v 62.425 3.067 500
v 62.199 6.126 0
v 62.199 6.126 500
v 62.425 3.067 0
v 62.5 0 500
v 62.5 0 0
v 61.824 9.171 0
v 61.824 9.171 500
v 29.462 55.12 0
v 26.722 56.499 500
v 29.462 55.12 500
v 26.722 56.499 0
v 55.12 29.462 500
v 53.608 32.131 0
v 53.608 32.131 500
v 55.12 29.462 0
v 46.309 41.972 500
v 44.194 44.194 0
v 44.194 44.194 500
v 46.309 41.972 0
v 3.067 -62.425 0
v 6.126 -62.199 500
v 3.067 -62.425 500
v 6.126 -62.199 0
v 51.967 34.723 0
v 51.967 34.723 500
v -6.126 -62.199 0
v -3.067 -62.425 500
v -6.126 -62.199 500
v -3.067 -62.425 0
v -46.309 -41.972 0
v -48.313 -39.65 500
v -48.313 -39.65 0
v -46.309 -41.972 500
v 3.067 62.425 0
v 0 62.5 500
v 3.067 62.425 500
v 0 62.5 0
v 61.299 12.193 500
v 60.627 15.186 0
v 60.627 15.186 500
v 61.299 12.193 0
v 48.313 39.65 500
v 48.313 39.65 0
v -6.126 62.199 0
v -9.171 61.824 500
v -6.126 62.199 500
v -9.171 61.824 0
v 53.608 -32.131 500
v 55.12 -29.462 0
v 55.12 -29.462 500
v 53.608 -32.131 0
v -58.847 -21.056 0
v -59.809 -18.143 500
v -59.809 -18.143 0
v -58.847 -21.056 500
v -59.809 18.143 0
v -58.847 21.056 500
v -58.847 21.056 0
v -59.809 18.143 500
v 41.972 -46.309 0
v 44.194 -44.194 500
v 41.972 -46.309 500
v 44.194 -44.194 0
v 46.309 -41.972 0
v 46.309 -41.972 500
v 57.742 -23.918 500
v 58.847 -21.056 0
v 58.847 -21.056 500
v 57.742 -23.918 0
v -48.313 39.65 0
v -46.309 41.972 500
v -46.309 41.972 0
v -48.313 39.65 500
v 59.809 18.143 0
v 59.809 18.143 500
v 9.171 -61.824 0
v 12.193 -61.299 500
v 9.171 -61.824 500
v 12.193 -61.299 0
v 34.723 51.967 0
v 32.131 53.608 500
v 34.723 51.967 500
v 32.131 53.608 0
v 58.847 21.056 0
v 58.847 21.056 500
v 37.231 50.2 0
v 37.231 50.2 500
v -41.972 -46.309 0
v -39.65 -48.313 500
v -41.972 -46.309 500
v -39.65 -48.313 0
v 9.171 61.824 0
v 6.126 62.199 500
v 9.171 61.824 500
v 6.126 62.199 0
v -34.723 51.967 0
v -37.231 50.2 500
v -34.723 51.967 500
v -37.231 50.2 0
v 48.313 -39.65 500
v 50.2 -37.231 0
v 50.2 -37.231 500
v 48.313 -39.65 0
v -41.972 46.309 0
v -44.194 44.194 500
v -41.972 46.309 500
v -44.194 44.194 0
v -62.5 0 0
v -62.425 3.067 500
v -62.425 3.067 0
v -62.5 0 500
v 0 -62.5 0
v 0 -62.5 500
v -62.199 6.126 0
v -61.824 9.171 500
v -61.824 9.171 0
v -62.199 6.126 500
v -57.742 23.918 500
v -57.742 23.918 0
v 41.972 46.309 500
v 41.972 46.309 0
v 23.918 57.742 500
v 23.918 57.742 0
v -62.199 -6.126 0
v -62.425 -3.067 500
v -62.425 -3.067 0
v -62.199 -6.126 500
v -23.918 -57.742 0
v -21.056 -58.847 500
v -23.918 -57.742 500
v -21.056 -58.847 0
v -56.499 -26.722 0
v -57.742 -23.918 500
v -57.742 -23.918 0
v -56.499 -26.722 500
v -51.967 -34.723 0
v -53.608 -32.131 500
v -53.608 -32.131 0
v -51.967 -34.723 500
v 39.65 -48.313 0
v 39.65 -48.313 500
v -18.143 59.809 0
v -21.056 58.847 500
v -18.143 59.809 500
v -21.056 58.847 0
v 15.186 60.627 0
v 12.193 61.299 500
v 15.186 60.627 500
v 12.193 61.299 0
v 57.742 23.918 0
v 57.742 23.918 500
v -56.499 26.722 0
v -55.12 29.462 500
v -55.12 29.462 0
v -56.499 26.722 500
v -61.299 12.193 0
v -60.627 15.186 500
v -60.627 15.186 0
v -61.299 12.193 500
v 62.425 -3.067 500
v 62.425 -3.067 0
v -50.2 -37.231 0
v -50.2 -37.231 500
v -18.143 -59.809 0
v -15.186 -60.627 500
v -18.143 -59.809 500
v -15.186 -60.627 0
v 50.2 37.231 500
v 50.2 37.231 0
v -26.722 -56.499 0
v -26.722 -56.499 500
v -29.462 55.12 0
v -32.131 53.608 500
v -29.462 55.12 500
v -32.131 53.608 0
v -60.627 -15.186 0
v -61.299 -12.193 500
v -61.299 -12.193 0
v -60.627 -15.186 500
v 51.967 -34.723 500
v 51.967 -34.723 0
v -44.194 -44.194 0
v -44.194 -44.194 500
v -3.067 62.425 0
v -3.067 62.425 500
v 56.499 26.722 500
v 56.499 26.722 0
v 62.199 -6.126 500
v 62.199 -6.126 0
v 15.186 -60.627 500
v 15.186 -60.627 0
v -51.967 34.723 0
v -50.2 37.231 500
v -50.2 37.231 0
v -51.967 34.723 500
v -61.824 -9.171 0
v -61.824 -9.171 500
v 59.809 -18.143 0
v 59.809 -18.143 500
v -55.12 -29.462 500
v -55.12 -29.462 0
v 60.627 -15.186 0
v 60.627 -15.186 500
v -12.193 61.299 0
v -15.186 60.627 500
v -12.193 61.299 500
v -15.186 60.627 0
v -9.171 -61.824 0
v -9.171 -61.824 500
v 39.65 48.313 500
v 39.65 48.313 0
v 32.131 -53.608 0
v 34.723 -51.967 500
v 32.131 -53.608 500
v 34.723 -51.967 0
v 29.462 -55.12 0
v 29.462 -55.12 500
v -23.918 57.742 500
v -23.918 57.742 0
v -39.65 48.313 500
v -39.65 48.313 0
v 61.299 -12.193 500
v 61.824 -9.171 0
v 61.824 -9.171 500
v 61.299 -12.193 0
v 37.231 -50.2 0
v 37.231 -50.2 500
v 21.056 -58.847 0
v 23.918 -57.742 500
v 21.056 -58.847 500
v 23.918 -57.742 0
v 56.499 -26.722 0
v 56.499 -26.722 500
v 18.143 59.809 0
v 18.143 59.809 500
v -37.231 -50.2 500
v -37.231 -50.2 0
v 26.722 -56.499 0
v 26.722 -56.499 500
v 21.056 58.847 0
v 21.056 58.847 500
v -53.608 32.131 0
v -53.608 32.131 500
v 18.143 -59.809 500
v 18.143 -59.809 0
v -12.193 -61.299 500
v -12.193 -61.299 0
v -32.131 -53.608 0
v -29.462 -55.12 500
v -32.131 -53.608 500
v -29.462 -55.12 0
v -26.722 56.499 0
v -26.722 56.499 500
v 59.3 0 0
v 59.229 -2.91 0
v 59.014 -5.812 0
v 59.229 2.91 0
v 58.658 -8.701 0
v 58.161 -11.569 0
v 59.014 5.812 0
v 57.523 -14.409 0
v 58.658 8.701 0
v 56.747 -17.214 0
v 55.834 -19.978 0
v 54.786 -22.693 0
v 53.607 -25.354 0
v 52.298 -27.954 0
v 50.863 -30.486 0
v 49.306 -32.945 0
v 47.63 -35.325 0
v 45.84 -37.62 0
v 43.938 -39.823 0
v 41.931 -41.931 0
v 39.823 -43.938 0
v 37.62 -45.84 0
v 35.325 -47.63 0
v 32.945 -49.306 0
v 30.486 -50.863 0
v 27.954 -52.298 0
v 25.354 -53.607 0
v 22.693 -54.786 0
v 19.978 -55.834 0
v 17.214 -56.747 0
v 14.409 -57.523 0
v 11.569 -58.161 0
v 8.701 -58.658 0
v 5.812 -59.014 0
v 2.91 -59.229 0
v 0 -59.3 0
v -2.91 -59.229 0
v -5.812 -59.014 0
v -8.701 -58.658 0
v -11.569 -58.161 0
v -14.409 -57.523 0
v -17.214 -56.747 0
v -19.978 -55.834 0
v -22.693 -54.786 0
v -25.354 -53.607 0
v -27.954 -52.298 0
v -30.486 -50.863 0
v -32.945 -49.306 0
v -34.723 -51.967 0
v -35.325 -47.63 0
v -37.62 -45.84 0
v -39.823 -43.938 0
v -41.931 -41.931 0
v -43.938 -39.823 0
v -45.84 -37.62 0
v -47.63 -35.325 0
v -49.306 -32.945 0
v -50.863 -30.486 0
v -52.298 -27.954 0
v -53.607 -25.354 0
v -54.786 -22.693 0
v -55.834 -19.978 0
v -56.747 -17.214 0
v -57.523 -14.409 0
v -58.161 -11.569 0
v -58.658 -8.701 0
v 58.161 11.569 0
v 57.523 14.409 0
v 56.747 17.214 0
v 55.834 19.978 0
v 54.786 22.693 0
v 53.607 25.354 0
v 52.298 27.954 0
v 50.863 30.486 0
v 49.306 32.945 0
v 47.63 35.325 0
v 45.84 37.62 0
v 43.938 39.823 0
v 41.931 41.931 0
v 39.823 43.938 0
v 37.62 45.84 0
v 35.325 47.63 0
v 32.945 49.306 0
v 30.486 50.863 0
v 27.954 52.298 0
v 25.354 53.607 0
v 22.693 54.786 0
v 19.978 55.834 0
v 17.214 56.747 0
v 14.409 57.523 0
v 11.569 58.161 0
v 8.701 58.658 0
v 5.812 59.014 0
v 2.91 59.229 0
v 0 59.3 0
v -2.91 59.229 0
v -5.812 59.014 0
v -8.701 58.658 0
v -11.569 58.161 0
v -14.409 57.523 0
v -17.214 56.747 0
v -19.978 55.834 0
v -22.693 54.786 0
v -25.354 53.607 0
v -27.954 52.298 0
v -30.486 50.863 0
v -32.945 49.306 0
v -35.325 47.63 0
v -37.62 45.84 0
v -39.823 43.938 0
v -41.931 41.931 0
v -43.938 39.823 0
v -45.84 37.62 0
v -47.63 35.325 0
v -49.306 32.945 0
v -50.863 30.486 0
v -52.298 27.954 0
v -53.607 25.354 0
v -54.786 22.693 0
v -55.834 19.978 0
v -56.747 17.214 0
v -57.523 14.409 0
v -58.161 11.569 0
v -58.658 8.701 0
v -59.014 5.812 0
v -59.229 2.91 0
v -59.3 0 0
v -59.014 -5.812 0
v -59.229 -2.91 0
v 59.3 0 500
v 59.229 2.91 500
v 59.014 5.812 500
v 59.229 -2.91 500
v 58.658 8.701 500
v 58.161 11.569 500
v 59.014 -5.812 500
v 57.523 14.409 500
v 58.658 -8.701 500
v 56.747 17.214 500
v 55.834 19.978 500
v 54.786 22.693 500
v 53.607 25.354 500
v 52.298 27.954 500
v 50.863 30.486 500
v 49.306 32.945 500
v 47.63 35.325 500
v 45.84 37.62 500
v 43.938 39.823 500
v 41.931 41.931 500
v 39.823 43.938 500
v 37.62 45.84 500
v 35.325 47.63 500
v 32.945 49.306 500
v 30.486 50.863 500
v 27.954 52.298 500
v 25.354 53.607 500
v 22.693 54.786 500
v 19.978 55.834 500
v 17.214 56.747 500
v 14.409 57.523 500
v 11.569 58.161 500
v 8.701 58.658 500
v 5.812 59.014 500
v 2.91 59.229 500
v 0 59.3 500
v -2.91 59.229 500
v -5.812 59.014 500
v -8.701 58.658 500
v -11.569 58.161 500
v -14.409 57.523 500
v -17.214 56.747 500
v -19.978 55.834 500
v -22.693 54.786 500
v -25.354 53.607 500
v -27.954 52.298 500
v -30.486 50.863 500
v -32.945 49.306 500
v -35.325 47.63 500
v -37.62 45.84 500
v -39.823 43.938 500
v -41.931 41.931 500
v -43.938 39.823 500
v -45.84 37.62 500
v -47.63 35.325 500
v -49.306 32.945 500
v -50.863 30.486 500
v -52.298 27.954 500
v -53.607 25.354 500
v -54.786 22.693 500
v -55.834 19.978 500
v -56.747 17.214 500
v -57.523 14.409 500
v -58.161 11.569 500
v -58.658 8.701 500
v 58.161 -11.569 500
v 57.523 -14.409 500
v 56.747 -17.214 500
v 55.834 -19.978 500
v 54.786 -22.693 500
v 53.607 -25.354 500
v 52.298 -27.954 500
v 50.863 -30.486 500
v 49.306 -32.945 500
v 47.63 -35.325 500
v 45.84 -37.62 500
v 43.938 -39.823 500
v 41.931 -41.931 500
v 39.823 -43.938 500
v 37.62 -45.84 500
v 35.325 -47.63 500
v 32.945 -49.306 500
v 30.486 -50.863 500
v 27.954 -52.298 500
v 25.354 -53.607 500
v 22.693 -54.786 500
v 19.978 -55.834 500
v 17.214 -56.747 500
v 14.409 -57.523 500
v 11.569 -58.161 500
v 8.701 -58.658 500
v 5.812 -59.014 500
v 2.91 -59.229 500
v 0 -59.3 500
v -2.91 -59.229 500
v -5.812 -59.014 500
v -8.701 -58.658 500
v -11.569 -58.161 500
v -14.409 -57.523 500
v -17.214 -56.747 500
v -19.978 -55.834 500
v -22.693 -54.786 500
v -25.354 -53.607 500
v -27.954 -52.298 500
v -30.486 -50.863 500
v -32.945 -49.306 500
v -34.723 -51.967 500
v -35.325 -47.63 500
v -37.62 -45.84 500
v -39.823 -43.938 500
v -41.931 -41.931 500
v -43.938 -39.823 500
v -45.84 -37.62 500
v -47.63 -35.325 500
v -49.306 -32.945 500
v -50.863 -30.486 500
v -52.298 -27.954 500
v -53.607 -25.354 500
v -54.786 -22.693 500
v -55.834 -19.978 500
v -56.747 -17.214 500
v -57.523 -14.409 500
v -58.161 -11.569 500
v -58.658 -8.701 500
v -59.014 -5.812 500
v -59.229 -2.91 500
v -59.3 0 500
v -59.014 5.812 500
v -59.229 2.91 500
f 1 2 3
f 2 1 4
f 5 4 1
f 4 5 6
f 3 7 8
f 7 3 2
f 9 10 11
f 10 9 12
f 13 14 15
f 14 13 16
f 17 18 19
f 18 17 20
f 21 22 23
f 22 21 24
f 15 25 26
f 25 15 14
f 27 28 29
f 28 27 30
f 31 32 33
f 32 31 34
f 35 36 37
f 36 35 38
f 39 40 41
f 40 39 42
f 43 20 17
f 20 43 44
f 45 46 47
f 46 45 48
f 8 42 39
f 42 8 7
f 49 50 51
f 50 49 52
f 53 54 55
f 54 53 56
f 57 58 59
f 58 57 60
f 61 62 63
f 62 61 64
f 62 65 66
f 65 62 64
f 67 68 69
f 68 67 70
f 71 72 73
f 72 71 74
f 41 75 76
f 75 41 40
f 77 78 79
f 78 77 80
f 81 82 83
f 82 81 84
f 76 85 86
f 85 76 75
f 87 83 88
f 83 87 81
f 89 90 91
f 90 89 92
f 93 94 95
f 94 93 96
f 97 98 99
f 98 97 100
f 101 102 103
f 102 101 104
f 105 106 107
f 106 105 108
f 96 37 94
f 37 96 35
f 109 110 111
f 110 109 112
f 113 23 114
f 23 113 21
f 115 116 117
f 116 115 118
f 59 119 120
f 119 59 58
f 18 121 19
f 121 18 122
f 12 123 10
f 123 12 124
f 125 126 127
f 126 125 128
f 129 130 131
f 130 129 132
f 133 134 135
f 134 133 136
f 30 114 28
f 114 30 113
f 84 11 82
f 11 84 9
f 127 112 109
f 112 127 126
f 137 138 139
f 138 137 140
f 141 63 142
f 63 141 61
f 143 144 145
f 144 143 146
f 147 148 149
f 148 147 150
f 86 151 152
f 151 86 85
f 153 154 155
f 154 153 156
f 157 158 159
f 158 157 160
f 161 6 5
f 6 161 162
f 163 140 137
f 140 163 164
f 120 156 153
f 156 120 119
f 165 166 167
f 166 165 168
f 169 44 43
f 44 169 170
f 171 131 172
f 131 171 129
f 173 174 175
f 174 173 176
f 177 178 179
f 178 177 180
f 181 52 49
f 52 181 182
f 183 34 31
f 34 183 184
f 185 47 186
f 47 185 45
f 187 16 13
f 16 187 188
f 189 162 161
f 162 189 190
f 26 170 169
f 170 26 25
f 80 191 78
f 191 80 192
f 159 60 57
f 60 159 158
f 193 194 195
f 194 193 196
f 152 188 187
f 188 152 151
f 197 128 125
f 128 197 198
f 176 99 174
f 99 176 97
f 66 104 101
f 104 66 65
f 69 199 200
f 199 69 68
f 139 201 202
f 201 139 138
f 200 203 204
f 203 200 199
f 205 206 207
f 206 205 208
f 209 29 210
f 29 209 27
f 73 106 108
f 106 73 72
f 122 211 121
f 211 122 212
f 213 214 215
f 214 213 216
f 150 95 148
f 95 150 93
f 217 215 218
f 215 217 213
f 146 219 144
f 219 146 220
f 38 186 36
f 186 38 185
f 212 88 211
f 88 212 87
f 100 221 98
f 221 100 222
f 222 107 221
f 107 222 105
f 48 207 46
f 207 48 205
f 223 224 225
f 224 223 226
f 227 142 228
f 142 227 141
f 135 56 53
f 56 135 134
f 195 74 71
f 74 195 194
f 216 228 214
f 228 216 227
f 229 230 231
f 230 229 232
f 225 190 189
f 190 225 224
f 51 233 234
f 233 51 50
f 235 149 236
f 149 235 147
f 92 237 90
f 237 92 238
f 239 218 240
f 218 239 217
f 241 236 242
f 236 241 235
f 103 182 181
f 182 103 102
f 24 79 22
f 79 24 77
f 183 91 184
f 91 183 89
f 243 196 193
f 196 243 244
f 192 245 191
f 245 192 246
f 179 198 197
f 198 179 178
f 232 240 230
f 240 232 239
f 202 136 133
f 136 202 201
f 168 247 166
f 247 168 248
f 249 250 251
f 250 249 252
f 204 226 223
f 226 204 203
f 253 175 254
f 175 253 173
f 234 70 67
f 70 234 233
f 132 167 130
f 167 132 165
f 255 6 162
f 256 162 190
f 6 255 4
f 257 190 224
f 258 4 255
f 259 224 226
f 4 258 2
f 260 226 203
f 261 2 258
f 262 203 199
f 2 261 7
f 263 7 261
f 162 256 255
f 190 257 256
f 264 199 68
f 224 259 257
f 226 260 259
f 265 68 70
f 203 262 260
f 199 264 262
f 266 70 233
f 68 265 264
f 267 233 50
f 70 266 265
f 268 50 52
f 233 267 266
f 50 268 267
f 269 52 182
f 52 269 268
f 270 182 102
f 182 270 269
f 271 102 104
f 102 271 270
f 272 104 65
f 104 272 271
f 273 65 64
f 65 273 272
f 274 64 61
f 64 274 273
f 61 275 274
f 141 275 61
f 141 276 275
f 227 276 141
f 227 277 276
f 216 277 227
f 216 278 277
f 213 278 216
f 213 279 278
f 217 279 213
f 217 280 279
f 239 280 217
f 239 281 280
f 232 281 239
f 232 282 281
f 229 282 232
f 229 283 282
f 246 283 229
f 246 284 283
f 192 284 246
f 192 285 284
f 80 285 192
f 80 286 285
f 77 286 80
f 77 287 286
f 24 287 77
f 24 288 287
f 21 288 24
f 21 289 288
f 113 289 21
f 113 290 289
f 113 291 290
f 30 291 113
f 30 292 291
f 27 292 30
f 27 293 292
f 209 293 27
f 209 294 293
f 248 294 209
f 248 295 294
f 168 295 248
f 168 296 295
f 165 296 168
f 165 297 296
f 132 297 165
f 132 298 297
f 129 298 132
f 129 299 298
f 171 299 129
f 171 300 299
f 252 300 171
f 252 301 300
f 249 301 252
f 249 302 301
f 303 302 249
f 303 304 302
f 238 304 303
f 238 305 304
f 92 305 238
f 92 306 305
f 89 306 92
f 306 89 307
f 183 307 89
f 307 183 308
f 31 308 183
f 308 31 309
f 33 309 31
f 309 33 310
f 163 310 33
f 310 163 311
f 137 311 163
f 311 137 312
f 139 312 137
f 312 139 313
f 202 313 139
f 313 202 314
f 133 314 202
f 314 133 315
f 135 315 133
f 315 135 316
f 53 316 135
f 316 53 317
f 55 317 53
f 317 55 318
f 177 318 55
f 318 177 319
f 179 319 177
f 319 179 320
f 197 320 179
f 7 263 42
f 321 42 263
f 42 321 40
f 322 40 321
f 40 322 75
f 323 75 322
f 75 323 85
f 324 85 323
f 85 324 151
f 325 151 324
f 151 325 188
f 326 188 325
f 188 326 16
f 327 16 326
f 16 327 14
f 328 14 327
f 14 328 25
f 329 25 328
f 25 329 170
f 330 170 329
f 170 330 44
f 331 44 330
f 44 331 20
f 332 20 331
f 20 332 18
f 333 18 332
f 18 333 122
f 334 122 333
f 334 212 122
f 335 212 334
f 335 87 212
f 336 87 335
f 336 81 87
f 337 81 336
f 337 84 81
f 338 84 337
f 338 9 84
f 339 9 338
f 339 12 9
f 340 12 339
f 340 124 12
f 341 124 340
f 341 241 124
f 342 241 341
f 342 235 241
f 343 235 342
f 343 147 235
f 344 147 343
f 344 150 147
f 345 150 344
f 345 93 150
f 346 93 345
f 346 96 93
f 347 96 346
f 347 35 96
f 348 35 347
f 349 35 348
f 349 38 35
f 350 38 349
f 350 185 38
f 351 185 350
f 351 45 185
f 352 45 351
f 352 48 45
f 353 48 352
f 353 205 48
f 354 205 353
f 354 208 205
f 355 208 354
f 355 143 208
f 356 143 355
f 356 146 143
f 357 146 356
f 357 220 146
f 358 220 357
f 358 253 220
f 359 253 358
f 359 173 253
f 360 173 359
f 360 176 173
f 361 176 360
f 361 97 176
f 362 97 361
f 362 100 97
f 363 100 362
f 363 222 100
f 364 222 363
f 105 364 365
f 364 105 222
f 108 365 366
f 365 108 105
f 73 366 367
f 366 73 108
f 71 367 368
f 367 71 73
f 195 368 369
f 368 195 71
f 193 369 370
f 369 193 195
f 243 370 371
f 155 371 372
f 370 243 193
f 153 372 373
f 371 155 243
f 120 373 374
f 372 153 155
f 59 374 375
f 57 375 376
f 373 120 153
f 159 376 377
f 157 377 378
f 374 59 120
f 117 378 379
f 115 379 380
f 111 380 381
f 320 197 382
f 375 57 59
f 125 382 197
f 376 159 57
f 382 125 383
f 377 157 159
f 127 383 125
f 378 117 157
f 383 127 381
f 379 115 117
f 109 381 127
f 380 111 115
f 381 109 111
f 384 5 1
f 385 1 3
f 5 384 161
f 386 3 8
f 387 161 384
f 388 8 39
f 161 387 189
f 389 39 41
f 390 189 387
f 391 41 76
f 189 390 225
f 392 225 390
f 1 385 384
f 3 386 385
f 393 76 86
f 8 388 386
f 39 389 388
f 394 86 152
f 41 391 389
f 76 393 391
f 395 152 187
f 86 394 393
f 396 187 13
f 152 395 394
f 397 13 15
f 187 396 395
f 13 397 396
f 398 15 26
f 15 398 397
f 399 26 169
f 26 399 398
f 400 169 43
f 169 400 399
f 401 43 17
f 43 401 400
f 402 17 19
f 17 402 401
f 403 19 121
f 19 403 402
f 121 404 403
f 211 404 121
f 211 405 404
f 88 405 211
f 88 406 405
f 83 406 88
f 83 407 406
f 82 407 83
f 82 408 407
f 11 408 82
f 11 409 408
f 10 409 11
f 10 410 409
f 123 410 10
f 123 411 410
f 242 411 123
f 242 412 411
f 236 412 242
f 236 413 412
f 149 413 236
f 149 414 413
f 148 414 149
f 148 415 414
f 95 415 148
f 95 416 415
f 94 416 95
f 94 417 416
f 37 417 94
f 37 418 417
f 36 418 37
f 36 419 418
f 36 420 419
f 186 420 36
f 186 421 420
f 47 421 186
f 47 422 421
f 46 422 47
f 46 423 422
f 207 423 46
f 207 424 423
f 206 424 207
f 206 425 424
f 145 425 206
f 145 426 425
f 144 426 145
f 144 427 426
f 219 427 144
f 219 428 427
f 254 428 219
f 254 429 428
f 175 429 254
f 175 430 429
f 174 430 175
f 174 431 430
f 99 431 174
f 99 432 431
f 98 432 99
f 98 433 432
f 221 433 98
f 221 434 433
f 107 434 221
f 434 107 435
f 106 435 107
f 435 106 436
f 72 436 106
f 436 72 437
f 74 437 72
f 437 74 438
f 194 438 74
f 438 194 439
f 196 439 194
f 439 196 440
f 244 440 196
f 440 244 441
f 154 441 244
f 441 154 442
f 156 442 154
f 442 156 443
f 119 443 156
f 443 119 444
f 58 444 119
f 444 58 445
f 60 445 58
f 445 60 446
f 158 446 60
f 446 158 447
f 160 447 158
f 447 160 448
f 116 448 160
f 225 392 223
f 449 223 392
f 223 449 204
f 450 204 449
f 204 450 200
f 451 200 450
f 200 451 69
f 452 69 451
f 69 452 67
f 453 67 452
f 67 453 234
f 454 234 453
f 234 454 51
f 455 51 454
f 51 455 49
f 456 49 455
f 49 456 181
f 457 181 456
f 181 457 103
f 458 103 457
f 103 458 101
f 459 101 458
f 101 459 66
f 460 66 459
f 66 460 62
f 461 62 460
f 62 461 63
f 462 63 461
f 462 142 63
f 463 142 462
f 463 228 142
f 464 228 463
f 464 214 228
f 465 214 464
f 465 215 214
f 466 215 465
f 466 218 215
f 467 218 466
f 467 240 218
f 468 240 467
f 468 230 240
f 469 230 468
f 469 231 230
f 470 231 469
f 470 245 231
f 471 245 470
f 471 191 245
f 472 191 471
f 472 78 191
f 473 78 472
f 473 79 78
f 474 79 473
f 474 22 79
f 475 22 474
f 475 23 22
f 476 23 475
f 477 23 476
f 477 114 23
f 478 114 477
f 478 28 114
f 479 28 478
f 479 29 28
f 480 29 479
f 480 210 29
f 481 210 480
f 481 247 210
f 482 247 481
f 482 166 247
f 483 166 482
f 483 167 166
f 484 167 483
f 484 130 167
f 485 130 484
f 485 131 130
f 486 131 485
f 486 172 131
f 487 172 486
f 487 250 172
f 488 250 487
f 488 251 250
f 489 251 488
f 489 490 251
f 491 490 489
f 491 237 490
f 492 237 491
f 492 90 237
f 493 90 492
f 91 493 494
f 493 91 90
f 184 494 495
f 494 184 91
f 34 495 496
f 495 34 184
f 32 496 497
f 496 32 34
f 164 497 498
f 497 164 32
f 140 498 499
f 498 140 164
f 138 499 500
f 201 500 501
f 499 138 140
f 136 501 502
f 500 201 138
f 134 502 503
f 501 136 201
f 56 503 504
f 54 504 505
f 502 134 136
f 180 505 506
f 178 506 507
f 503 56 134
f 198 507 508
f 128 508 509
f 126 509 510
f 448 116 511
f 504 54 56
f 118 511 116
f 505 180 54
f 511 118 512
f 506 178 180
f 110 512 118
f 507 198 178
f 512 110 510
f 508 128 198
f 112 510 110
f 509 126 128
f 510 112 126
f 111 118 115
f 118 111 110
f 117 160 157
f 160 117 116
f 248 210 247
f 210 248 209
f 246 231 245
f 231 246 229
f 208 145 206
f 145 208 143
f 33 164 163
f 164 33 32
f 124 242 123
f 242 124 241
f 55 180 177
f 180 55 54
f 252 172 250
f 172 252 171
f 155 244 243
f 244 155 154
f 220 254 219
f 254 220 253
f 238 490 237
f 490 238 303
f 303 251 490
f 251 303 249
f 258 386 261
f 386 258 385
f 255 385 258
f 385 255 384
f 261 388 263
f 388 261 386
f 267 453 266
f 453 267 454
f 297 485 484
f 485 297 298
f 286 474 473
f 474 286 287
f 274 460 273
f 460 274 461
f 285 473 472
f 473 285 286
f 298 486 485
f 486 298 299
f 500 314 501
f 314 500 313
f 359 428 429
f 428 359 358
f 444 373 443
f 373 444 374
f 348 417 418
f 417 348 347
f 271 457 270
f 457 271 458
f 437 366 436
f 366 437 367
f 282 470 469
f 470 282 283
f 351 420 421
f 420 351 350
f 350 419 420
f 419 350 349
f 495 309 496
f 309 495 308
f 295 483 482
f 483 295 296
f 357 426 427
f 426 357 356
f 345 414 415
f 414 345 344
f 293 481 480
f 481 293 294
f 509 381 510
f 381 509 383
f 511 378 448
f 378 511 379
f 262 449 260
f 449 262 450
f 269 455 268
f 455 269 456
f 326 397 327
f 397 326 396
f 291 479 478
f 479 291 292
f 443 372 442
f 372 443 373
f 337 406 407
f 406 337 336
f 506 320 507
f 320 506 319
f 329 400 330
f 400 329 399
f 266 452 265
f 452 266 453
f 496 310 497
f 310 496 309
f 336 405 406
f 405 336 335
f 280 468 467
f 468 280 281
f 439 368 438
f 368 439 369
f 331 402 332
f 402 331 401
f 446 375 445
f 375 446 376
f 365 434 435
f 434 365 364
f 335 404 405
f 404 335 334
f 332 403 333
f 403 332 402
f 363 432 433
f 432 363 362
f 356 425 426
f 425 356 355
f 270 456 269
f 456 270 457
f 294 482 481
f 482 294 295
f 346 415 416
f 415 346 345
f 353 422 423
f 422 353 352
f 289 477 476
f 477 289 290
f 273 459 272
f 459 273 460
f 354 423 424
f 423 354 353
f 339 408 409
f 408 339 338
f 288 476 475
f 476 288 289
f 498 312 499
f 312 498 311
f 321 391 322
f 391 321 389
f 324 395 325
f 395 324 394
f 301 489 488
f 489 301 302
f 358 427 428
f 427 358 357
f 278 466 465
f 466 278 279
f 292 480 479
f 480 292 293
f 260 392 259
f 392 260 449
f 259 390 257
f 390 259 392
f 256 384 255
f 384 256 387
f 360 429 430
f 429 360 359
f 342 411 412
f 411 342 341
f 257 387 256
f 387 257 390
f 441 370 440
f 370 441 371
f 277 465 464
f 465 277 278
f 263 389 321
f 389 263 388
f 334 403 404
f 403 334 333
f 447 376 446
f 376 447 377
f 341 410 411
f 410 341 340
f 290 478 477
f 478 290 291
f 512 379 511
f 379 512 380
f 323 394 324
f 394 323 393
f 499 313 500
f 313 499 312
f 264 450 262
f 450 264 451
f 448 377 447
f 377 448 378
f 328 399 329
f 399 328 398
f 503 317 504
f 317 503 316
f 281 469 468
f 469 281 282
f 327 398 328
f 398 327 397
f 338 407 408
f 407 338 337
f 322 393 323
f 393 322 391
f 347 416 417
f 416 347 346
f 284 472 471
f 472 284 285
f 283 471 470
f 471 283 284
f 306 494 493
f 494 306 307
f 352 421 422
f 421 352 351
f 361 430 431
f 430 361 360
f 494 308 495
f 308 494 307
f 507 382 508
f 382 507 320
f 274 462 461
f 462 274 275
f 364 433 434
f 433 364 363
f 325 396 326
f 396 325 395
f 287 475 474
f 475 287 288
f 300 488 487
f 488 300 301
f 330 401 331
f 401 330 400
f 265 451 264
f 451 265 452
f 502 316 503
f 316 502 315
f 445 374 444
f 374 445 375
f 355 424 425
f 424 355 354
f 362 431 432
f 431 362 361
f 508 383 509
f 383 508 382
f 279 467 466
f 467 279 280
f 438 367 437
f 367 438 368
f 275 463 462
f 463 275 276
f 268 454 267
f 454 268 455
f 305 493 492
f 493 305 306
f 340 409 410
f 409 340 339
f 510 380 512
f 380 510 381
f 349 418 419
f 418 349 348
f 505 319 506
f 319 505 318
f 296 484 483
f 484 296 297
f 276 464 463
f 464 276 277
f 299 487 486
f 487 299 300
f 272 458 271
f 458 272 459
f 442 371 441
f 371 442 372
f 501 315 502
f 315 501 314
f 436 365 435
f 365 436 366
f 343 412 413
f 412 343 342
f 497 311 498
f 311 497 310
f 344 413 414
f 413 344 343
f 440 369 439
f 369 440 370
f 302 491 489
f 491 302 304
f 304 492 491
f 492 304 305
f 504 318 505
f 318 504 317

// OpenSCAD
$fn = 128;

// HT pipe parameters (approximate for HT 125)
od = 125;          // outer diameter (mm)
wall = 3.2;        // wall thickness (mm) typical for HT DN125
len = 500;         // length (mm)

id = od - 2*wall;

difference() {
    cylinder(h = len, d = od, center = false);
    translate([0,0,-0.1])
        cylinder(h = len + 0.2, d = id, center = false);
}
